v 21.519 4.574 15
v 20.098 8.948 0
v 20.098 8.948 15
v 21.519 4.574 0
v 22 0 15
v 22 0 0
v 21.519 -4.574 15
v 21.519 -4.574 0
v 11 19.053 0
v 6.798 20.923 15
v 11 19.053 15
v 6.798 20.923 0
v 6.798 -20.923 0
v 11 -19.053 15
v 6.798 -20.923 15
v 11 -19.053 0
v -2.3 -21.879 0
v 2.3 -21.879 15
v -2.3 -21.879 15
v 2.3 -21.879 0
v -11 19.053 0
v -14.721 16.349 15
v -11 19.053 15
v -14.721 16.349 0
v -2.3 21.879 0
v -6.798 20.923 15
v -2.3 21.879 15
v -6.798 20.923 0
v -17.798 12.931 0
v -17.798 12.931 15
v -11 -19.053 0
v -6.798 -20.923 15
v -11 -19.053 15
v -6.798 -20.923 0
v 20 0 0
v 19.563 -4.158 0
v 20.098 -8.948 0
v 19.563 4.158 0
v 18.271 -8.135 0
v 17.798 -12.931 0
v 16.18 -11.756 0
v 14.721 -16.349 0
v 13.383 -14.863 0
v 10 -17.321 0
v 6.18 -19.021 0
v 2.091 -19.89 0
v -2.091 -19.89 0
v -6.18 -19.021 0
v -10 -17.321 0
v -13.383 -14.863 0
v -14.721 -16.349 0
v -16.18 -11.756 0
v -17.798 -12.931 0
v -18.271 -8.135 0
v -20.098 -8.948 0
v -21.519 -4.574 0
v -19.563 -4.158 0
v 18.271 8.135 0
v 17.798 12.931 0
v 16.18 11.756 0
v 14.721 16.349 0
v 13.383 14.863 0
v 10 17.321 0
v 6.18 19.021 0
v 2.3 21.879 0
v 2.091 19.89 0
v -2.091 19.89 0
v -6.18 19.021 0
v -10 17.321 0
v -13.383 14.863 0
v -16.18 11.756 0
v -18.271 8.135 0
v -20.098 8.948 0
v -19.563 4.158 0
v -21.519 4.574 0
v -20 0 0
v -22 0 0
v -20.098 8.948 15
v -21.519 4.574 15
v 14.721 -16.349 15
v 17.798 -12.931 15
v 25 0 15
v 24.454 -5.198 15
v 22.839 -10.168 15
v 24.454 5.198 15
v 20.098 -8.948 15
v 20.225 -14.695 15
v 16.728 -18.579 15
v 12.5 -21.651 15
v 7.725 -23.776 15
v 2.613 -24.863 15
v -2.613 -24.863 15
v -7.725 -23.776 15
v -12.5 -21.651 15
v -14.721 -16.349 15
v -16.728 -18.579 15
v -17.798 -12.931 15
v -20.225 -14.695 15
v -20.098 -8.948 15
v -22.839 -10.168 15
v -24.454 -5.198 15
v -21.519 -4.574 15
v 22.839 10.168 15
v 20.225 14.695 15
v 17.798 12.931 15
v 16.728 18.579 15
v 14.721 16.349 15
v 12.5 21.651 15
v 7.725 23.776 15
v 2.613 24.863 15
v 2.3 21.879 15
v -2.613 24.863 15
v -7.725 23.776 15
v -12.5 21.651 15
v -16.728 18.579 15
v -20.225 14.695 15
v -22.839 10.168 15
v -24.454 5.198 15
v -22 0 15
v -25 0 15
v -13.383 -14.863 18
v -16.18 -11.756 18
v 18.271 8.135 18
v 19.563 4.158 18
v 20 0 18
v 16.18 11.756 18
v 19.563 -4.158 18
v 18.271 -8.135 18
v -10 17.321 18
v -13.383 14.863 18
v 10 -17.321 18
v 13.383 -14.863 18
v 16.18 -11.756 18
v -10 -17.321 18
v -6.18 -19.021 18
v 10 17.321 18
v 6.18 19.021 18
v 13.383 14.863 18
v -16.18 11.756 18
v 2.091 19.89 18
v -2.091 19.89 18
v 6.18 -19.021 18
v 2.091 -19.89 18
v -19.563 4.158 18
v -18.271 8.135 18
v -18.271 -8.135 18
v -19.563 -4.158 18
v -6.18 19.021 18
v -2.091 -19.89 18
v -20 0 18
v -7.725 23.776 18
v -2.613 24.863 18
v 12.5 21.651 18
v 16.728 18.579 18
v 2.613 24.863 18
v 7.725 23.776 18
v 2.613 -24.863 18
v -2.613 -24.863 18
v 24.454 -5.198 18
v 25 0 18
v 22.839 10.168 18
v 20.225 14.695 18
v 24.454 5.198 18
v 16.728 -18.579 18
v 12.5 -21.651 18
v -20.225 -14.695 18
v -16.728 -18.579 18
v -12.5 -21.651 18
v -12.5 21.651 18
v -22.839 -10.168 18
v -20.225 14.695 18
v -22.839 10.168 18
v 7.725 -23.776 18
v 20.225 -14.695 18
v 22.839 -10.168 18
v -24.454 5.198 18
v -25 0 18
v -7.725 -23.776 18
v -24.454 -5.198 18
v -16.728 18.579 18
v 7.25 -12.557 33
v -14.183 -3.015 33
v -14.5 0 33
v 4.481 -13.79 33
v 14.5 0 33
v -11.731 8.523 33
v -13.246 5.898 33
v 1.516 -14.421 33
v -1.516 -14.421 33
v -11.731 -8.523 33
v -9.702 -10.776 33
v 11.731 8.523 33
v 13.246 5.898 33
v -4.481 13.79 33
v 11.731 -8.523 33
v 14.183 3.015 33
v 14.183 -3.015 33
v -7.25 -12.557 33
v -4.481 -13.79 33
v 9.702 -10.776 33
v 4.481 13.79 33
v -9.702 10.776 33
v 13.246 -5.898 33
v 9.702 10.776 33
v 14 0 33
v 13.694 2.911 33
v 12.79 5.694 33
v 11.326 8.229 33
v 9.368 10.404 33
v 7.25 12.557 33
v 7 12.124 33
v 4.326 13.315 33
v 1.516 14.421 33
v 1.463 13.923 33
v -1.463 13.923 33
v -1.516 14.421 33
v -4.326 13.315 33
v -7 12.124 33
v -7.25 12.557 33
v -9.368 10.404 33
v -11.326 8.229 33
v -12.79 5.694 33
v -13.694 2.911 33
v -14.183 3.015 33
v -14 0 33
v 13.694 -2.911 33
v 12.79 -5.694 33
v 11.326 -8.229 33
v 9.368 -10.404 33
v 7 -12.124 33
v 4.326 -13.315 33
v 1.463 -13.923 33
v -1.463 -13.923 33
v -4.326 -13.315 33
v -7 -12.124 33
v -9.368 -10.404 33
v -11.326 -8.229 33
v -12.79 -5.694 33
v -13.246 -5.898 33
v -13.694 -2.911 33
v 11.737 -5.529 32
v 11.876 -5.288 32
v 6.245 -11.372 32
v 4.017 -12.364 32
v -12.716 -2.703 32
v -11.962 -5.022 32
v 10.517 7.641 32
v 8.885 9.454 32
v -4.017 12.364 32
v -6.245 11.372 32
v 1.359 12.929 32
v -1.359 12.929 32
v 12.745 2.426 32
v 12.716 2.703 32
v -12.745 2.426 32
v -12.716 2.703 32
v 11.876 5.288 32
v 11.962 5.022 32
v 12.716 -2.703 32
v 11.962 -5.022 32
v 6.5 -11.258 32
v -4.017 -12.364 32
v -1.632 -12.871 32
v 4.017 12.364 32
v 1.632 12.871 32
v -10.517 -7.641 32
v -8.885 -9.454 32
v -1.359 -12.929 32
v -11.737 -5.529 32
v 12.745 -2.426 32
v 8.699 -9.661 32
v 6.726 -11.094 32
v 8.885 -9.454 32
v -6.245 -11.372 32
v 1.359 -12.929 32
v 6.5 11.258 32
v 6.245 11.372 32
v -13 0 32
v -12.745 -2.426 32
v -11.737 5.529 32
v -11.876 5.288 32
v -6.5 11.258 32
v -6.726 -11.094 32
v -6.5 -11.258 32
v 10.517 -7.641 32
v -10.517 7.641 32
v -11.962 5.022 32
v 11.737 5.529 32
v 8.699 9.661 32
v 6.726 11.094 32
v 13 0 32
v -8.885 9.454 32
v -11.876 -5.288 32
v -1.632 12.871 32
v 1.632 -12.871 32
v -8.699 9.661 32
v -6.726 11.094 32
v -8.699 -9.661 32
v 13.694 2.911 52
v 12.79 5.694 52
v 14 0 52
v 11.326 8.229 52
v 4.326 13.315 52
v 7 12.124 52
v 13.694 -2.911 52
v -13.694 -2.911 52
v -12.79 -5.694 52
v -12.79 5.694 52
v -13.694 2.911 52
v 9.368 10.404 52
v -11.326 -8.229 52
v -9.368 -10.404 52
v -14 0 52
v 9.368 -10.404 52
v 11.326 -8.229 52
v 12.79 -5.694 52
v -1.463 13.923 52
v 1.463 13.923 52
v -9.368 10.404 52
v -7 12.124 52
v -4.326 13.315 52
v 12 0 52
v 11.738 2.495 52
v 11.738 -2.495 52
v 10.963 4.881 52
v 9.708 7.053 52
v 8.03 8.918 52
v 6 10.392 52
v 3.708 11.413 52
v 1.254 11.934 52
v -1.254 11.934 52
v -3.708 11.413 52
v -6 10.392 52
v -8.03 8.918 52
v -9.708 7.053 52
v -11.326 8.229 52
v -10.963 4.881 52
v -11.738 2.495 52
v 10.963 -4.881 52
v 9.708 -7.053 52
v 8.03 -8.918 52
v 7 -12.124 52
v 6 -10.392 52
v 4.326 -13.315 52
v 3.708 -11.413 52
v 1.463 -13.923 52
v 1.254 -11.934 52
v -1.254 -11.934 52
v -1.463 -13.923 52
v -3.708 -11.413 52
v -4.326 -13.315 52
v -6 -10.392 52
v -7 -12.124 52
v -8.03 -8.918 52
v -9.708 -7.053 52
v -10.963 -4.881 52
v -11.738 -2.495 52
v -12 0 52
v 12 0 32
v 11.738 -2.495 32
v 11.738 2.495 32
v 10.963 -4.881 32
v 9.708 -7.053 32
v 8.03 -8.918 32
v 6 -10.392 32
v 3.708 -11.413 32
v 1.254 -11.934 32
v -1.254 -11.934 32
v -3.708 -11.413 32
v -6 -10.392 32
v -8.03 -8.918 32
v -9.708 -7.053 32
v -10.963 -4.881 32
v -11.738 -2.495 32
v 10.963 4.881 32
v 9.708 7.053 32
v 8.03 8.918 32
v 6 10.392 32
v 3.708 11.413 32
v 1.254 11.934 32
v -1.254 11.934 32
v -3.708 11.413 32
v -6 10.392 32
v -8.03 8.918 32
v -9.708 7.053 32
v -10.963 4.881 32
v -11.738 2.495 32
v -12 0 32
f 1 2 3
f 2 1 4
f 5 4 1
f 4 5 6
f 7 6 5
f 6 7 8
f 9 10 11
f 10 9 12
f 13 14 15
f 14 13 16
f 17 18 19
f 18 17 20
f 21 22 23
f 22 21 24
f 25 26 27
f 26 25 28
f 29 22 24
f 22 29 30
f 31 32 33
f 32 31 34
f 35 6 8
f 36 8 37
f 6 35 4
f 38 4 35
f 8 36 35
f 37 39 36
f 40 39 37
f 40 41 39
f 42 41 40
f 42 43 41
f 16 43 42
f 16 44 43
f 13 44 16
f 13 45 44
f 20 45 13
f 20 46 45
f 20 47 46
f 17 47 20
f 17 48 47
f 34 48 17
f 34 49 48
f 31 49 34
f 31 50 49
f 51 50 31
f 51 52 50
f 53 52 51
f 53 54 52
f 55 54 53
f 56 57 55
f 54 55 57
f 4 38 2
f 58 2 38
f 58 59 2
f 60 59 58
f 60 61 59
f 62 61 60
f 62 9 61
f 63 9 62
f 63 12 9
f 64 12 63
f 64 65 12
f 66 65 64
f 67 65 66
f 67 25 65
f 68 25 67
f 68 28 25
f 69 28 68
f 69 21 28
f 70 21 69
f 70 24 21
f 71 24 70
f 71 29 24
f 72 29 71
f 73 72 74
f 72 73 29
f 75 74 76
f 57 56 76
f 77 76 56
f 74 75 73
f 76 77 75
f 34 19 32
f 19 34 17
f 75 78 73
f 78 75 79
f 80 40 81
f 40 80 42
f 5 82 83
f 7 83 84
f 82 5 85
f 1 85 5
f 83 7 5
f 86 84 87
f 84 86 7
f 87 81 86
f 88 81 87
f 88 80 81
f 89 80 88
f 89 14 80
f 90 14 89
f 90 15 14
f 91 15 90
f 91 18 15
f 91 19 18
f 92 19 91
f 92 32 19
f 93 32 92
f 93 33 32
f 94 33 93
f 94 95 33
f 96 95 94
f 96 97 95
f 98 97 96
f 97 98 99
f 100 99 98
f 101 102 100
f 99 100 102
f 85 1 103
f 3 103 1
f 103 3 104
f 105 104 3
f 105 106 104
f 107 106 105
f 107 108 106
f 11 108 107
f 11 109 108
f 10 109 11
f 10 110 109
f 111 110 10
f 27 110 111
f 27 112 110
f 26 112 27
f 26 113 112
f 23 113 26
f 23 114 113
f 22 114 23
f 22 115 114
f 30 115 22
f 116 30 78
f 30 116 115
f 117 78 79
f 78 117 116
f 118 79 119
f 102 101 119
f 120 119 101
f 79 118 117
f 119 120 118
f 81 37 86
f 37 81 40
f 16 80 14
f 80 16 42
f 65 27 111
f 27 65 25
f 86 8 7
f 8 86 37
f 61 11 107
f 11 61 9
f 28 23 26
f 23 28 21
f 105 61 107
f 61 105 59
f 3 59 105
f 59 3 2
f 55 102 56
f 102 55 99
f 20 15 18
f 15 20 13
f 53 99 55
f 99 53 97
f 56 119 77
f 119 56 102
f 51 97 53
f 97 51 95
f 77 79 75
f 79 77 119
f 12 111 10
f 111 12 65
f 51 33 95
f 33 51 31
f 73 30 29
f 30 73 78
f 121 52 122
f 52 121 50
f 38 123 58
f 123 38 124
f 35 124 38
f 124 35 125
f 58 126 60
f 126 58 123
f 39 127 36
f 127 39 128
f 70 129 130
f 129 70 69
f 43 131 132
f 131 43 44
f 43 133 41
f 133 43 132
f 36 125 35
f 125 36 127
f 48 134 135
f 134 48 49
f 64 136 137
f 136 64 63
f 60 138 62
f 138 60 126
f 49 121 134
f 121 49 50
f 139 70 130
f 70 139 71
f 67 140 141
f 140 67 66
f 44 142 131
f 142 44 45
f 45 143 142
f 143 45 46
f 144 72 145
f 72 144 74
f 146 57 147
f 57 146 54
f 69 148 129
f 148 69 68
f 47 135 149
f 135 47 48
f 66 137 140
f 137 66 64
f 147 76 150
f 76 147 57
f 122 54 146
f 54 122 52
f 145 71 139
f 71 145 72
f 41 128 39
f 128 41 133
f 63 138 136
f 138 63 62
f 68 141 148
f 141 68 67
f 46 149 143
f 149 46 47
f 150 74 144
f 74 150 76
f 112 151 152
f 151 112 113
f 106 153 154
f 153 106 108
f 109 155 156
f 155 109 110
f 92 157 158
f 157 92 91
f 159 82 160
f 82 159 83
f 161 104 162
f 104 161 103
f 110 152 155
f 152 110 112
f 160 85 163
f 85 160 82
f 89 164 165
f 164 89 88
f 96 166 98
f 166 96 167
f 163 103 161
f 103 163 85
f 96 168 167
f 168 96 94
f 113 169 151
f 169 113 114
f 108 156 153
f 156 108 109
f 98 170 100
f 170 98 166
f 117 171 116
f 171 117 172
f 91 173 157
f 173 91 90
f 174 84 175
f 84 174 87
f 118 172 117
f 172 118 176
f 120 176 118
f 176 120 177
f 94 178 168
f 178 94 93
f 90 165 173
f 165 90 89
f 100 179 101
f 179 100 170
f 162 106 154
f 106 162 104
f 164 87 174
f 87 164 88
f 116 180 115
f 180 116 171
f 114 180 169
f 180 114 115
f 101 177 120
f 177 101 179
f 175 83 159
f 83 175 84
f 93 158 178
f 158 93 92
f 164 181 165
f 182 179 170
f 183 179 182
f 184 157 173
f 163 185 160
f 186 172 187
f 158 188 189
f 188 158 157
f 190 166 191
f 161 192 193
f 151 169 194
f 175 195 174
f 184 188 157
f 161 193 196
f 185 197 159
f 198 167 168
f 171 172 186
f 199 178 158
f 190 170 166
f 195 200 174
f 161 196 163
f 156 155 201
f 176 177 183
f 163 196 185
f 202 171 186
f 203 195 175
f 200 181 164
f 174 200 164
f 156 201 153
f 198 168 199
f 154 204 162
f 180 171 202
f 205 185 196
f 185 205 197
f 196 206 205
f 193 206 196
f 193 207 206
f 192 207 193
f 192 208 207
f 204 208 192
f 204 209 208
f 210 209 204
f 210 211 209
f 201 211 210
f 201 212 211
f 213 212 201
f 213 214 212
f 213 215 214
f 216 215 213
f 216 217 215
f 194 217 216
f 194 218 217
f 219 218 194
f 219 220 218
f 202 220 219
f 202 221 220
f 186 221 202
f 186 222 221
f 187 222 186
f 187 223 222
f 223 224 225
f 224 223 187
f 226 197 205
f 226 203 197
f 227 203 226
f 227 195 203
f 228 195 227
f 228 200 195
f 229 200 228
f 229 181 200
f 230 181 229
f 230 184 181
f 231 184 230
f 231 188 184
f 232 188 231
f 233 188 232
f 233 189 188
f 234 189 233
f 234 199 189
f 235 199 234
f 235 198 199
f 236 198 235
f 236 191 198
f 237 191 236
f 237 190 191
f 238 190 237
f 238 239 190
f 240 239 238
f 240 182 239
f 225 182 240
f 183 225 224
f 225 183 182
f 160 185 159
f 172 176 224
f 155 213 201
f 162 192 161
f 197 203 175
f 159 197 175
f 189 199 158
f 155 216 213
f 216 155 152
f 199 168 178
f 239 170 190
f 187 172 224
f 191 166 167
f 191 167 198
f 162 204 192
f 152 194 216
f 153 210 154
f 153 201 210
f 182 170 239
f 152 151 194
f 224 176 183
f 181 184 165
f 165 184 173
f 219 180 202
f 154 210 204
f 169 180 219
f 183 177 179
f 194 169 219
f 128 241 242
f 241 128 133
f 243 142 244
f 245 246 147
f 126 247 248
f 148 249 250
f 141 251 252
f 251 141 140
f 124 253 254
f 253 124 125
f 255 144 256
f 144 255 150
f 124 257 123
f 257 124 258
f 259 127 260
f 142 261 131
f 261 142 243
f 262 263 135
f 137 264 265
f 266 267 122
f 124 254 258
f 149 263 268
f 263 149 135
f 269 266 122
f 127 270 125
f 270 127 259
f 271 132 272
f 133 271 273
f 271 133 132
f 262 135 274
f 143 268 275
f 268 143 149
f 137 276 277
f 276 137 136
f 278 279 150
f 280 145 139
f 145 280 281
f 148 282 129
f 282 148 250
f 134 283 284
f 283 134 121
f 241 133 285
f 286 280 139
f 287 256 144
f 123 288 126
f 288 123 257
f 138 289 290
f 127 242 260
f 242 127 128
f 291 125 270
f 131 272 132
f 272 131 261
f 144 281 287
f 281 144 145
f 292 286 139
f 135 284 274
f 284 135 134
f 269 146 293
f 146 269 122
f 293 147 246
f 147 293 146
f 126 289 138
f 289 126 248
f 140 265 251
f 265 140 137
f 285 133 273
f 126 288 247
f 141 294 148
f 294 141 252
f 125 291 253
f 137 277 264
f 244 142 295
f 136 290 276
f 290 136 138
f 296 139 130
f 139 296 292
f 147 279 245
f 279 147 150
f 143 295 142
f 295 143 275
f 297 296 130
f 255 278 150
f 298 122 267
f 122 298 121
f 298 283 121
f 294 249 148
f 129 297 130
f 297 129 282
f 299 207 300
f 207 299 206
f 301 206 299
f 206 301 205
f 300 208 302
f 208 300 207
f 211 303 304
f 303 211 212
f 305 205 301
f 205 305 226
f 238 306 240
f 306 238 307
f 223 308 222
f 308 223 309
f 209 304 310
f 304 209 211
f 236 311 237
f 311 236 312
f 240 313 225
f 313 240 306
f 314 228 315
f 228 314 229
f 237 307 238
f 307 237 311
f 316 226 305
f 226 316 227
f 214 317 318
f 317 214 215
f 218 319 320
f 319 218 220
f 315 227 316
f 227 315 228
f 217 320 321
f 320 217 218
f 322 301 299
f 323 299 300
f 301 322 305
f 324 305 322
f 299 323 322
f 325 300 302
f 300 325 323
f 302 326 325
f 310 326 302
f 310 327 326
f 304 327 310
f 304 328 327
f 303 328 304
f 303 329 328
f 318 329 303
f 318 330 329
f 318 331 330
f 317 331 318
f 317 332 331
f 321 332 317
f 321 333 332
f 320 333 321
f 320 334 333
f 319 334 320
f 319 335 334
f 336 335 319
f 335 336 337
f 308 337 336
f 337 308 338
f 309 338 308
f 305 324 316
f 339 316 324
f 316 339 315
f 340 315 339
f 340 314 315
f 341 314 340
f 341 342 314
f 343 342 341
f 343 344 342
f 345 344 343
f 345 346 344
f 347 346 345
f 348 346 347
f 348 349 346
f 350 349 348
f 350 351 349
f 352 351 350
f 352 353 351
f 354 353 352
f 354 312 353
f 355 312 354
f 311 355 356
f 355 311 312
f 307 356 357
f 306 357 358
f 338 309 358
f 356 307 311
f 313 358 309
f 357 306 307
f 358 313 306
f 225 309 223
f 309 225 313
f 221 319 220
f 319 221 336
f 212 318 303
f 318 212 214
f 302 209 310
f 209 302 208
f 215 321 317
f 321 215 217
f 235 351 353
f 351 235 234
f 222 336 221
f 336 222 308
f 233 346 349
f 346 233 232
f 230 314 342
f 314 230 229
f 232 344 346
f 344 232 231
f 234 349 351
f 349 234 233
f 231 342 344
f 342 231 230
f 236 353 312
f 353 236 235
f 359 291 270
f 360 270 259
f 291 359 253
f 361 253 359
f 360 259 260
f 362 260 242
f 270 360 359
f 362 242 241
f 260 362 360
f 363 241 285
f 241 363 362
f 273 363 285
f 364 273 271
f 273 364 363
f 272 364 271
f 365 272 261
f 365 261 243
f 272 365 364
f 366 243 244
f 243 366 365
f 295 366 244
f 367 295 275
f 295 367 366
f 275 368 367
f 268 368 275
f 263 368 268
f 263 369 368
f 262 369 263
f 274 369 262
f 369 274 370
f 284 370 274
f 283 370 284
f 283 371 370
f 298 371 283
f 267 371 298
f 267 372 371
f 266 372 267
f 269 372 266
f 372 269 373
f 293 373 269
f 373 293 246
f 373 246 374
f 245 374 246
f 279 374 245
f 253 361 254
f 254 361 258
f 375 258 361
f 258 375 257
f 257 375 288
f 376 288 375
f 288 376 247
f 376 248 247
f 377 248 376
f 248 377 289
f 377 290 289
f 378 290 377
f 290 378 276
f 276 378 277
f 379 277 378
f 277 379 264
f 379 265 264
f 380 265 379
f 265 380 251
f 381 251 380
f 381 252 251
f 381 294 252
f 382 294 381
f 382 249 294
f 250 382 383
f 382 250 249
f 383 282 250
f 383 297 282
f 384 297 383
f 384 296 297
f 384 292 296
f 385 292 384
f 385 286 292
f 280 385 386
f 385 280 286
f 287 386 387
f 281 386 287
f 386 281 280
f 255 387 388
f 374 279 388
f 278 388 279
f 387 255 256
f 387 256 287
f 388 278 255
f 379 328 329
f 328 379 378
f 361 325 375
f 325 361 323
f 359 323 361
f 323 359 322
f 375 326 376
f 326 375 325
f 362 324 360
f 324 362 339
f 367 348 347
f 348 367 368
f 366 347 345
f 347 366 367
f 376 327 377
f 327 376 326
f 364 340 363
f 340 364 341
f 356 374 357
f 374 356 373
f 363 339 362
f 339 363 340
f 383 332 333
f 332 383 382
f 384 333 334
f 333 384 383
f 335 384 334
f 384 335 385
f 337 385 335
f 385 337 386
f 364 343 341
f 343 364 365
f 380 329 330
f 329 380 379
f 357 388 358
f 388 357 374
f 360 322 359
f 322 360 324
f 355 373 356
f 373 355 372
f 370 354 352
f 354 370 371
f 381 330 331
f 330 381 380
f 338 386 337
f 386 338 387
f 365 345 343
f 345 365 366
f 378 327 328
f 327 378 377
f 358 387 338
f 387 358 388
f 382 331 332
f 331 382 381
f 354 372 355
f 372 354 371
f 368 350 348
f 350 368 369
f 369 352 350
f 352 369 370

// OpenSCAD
union(){
    difference(){
        cylinder(r=22, h=15);
        cylinder(r=20, h= 15);
    }
    translate([0,0,15]){
        difference(){
            cylinder(r=25, h=2);
            cylinder(r=20, h=2);
        }
    }
    translate([0,0,17]){
        difference(){
            hull(){
                cylinder(r=25,h=1);
                translate([0,0,15]) cylinder(r=14.5,h=1);
            }
            hull(){
                cylinder(r=20,h=1);
                translate([0,0,15]) cylinder(r=12.5,h=1);
            }
        }
    }
    translate([0,0,32]){
        difference(){
             cylinder(r=14,5, h=20);
            cylinder(r=12,5, h=20);
        }
    }
}
